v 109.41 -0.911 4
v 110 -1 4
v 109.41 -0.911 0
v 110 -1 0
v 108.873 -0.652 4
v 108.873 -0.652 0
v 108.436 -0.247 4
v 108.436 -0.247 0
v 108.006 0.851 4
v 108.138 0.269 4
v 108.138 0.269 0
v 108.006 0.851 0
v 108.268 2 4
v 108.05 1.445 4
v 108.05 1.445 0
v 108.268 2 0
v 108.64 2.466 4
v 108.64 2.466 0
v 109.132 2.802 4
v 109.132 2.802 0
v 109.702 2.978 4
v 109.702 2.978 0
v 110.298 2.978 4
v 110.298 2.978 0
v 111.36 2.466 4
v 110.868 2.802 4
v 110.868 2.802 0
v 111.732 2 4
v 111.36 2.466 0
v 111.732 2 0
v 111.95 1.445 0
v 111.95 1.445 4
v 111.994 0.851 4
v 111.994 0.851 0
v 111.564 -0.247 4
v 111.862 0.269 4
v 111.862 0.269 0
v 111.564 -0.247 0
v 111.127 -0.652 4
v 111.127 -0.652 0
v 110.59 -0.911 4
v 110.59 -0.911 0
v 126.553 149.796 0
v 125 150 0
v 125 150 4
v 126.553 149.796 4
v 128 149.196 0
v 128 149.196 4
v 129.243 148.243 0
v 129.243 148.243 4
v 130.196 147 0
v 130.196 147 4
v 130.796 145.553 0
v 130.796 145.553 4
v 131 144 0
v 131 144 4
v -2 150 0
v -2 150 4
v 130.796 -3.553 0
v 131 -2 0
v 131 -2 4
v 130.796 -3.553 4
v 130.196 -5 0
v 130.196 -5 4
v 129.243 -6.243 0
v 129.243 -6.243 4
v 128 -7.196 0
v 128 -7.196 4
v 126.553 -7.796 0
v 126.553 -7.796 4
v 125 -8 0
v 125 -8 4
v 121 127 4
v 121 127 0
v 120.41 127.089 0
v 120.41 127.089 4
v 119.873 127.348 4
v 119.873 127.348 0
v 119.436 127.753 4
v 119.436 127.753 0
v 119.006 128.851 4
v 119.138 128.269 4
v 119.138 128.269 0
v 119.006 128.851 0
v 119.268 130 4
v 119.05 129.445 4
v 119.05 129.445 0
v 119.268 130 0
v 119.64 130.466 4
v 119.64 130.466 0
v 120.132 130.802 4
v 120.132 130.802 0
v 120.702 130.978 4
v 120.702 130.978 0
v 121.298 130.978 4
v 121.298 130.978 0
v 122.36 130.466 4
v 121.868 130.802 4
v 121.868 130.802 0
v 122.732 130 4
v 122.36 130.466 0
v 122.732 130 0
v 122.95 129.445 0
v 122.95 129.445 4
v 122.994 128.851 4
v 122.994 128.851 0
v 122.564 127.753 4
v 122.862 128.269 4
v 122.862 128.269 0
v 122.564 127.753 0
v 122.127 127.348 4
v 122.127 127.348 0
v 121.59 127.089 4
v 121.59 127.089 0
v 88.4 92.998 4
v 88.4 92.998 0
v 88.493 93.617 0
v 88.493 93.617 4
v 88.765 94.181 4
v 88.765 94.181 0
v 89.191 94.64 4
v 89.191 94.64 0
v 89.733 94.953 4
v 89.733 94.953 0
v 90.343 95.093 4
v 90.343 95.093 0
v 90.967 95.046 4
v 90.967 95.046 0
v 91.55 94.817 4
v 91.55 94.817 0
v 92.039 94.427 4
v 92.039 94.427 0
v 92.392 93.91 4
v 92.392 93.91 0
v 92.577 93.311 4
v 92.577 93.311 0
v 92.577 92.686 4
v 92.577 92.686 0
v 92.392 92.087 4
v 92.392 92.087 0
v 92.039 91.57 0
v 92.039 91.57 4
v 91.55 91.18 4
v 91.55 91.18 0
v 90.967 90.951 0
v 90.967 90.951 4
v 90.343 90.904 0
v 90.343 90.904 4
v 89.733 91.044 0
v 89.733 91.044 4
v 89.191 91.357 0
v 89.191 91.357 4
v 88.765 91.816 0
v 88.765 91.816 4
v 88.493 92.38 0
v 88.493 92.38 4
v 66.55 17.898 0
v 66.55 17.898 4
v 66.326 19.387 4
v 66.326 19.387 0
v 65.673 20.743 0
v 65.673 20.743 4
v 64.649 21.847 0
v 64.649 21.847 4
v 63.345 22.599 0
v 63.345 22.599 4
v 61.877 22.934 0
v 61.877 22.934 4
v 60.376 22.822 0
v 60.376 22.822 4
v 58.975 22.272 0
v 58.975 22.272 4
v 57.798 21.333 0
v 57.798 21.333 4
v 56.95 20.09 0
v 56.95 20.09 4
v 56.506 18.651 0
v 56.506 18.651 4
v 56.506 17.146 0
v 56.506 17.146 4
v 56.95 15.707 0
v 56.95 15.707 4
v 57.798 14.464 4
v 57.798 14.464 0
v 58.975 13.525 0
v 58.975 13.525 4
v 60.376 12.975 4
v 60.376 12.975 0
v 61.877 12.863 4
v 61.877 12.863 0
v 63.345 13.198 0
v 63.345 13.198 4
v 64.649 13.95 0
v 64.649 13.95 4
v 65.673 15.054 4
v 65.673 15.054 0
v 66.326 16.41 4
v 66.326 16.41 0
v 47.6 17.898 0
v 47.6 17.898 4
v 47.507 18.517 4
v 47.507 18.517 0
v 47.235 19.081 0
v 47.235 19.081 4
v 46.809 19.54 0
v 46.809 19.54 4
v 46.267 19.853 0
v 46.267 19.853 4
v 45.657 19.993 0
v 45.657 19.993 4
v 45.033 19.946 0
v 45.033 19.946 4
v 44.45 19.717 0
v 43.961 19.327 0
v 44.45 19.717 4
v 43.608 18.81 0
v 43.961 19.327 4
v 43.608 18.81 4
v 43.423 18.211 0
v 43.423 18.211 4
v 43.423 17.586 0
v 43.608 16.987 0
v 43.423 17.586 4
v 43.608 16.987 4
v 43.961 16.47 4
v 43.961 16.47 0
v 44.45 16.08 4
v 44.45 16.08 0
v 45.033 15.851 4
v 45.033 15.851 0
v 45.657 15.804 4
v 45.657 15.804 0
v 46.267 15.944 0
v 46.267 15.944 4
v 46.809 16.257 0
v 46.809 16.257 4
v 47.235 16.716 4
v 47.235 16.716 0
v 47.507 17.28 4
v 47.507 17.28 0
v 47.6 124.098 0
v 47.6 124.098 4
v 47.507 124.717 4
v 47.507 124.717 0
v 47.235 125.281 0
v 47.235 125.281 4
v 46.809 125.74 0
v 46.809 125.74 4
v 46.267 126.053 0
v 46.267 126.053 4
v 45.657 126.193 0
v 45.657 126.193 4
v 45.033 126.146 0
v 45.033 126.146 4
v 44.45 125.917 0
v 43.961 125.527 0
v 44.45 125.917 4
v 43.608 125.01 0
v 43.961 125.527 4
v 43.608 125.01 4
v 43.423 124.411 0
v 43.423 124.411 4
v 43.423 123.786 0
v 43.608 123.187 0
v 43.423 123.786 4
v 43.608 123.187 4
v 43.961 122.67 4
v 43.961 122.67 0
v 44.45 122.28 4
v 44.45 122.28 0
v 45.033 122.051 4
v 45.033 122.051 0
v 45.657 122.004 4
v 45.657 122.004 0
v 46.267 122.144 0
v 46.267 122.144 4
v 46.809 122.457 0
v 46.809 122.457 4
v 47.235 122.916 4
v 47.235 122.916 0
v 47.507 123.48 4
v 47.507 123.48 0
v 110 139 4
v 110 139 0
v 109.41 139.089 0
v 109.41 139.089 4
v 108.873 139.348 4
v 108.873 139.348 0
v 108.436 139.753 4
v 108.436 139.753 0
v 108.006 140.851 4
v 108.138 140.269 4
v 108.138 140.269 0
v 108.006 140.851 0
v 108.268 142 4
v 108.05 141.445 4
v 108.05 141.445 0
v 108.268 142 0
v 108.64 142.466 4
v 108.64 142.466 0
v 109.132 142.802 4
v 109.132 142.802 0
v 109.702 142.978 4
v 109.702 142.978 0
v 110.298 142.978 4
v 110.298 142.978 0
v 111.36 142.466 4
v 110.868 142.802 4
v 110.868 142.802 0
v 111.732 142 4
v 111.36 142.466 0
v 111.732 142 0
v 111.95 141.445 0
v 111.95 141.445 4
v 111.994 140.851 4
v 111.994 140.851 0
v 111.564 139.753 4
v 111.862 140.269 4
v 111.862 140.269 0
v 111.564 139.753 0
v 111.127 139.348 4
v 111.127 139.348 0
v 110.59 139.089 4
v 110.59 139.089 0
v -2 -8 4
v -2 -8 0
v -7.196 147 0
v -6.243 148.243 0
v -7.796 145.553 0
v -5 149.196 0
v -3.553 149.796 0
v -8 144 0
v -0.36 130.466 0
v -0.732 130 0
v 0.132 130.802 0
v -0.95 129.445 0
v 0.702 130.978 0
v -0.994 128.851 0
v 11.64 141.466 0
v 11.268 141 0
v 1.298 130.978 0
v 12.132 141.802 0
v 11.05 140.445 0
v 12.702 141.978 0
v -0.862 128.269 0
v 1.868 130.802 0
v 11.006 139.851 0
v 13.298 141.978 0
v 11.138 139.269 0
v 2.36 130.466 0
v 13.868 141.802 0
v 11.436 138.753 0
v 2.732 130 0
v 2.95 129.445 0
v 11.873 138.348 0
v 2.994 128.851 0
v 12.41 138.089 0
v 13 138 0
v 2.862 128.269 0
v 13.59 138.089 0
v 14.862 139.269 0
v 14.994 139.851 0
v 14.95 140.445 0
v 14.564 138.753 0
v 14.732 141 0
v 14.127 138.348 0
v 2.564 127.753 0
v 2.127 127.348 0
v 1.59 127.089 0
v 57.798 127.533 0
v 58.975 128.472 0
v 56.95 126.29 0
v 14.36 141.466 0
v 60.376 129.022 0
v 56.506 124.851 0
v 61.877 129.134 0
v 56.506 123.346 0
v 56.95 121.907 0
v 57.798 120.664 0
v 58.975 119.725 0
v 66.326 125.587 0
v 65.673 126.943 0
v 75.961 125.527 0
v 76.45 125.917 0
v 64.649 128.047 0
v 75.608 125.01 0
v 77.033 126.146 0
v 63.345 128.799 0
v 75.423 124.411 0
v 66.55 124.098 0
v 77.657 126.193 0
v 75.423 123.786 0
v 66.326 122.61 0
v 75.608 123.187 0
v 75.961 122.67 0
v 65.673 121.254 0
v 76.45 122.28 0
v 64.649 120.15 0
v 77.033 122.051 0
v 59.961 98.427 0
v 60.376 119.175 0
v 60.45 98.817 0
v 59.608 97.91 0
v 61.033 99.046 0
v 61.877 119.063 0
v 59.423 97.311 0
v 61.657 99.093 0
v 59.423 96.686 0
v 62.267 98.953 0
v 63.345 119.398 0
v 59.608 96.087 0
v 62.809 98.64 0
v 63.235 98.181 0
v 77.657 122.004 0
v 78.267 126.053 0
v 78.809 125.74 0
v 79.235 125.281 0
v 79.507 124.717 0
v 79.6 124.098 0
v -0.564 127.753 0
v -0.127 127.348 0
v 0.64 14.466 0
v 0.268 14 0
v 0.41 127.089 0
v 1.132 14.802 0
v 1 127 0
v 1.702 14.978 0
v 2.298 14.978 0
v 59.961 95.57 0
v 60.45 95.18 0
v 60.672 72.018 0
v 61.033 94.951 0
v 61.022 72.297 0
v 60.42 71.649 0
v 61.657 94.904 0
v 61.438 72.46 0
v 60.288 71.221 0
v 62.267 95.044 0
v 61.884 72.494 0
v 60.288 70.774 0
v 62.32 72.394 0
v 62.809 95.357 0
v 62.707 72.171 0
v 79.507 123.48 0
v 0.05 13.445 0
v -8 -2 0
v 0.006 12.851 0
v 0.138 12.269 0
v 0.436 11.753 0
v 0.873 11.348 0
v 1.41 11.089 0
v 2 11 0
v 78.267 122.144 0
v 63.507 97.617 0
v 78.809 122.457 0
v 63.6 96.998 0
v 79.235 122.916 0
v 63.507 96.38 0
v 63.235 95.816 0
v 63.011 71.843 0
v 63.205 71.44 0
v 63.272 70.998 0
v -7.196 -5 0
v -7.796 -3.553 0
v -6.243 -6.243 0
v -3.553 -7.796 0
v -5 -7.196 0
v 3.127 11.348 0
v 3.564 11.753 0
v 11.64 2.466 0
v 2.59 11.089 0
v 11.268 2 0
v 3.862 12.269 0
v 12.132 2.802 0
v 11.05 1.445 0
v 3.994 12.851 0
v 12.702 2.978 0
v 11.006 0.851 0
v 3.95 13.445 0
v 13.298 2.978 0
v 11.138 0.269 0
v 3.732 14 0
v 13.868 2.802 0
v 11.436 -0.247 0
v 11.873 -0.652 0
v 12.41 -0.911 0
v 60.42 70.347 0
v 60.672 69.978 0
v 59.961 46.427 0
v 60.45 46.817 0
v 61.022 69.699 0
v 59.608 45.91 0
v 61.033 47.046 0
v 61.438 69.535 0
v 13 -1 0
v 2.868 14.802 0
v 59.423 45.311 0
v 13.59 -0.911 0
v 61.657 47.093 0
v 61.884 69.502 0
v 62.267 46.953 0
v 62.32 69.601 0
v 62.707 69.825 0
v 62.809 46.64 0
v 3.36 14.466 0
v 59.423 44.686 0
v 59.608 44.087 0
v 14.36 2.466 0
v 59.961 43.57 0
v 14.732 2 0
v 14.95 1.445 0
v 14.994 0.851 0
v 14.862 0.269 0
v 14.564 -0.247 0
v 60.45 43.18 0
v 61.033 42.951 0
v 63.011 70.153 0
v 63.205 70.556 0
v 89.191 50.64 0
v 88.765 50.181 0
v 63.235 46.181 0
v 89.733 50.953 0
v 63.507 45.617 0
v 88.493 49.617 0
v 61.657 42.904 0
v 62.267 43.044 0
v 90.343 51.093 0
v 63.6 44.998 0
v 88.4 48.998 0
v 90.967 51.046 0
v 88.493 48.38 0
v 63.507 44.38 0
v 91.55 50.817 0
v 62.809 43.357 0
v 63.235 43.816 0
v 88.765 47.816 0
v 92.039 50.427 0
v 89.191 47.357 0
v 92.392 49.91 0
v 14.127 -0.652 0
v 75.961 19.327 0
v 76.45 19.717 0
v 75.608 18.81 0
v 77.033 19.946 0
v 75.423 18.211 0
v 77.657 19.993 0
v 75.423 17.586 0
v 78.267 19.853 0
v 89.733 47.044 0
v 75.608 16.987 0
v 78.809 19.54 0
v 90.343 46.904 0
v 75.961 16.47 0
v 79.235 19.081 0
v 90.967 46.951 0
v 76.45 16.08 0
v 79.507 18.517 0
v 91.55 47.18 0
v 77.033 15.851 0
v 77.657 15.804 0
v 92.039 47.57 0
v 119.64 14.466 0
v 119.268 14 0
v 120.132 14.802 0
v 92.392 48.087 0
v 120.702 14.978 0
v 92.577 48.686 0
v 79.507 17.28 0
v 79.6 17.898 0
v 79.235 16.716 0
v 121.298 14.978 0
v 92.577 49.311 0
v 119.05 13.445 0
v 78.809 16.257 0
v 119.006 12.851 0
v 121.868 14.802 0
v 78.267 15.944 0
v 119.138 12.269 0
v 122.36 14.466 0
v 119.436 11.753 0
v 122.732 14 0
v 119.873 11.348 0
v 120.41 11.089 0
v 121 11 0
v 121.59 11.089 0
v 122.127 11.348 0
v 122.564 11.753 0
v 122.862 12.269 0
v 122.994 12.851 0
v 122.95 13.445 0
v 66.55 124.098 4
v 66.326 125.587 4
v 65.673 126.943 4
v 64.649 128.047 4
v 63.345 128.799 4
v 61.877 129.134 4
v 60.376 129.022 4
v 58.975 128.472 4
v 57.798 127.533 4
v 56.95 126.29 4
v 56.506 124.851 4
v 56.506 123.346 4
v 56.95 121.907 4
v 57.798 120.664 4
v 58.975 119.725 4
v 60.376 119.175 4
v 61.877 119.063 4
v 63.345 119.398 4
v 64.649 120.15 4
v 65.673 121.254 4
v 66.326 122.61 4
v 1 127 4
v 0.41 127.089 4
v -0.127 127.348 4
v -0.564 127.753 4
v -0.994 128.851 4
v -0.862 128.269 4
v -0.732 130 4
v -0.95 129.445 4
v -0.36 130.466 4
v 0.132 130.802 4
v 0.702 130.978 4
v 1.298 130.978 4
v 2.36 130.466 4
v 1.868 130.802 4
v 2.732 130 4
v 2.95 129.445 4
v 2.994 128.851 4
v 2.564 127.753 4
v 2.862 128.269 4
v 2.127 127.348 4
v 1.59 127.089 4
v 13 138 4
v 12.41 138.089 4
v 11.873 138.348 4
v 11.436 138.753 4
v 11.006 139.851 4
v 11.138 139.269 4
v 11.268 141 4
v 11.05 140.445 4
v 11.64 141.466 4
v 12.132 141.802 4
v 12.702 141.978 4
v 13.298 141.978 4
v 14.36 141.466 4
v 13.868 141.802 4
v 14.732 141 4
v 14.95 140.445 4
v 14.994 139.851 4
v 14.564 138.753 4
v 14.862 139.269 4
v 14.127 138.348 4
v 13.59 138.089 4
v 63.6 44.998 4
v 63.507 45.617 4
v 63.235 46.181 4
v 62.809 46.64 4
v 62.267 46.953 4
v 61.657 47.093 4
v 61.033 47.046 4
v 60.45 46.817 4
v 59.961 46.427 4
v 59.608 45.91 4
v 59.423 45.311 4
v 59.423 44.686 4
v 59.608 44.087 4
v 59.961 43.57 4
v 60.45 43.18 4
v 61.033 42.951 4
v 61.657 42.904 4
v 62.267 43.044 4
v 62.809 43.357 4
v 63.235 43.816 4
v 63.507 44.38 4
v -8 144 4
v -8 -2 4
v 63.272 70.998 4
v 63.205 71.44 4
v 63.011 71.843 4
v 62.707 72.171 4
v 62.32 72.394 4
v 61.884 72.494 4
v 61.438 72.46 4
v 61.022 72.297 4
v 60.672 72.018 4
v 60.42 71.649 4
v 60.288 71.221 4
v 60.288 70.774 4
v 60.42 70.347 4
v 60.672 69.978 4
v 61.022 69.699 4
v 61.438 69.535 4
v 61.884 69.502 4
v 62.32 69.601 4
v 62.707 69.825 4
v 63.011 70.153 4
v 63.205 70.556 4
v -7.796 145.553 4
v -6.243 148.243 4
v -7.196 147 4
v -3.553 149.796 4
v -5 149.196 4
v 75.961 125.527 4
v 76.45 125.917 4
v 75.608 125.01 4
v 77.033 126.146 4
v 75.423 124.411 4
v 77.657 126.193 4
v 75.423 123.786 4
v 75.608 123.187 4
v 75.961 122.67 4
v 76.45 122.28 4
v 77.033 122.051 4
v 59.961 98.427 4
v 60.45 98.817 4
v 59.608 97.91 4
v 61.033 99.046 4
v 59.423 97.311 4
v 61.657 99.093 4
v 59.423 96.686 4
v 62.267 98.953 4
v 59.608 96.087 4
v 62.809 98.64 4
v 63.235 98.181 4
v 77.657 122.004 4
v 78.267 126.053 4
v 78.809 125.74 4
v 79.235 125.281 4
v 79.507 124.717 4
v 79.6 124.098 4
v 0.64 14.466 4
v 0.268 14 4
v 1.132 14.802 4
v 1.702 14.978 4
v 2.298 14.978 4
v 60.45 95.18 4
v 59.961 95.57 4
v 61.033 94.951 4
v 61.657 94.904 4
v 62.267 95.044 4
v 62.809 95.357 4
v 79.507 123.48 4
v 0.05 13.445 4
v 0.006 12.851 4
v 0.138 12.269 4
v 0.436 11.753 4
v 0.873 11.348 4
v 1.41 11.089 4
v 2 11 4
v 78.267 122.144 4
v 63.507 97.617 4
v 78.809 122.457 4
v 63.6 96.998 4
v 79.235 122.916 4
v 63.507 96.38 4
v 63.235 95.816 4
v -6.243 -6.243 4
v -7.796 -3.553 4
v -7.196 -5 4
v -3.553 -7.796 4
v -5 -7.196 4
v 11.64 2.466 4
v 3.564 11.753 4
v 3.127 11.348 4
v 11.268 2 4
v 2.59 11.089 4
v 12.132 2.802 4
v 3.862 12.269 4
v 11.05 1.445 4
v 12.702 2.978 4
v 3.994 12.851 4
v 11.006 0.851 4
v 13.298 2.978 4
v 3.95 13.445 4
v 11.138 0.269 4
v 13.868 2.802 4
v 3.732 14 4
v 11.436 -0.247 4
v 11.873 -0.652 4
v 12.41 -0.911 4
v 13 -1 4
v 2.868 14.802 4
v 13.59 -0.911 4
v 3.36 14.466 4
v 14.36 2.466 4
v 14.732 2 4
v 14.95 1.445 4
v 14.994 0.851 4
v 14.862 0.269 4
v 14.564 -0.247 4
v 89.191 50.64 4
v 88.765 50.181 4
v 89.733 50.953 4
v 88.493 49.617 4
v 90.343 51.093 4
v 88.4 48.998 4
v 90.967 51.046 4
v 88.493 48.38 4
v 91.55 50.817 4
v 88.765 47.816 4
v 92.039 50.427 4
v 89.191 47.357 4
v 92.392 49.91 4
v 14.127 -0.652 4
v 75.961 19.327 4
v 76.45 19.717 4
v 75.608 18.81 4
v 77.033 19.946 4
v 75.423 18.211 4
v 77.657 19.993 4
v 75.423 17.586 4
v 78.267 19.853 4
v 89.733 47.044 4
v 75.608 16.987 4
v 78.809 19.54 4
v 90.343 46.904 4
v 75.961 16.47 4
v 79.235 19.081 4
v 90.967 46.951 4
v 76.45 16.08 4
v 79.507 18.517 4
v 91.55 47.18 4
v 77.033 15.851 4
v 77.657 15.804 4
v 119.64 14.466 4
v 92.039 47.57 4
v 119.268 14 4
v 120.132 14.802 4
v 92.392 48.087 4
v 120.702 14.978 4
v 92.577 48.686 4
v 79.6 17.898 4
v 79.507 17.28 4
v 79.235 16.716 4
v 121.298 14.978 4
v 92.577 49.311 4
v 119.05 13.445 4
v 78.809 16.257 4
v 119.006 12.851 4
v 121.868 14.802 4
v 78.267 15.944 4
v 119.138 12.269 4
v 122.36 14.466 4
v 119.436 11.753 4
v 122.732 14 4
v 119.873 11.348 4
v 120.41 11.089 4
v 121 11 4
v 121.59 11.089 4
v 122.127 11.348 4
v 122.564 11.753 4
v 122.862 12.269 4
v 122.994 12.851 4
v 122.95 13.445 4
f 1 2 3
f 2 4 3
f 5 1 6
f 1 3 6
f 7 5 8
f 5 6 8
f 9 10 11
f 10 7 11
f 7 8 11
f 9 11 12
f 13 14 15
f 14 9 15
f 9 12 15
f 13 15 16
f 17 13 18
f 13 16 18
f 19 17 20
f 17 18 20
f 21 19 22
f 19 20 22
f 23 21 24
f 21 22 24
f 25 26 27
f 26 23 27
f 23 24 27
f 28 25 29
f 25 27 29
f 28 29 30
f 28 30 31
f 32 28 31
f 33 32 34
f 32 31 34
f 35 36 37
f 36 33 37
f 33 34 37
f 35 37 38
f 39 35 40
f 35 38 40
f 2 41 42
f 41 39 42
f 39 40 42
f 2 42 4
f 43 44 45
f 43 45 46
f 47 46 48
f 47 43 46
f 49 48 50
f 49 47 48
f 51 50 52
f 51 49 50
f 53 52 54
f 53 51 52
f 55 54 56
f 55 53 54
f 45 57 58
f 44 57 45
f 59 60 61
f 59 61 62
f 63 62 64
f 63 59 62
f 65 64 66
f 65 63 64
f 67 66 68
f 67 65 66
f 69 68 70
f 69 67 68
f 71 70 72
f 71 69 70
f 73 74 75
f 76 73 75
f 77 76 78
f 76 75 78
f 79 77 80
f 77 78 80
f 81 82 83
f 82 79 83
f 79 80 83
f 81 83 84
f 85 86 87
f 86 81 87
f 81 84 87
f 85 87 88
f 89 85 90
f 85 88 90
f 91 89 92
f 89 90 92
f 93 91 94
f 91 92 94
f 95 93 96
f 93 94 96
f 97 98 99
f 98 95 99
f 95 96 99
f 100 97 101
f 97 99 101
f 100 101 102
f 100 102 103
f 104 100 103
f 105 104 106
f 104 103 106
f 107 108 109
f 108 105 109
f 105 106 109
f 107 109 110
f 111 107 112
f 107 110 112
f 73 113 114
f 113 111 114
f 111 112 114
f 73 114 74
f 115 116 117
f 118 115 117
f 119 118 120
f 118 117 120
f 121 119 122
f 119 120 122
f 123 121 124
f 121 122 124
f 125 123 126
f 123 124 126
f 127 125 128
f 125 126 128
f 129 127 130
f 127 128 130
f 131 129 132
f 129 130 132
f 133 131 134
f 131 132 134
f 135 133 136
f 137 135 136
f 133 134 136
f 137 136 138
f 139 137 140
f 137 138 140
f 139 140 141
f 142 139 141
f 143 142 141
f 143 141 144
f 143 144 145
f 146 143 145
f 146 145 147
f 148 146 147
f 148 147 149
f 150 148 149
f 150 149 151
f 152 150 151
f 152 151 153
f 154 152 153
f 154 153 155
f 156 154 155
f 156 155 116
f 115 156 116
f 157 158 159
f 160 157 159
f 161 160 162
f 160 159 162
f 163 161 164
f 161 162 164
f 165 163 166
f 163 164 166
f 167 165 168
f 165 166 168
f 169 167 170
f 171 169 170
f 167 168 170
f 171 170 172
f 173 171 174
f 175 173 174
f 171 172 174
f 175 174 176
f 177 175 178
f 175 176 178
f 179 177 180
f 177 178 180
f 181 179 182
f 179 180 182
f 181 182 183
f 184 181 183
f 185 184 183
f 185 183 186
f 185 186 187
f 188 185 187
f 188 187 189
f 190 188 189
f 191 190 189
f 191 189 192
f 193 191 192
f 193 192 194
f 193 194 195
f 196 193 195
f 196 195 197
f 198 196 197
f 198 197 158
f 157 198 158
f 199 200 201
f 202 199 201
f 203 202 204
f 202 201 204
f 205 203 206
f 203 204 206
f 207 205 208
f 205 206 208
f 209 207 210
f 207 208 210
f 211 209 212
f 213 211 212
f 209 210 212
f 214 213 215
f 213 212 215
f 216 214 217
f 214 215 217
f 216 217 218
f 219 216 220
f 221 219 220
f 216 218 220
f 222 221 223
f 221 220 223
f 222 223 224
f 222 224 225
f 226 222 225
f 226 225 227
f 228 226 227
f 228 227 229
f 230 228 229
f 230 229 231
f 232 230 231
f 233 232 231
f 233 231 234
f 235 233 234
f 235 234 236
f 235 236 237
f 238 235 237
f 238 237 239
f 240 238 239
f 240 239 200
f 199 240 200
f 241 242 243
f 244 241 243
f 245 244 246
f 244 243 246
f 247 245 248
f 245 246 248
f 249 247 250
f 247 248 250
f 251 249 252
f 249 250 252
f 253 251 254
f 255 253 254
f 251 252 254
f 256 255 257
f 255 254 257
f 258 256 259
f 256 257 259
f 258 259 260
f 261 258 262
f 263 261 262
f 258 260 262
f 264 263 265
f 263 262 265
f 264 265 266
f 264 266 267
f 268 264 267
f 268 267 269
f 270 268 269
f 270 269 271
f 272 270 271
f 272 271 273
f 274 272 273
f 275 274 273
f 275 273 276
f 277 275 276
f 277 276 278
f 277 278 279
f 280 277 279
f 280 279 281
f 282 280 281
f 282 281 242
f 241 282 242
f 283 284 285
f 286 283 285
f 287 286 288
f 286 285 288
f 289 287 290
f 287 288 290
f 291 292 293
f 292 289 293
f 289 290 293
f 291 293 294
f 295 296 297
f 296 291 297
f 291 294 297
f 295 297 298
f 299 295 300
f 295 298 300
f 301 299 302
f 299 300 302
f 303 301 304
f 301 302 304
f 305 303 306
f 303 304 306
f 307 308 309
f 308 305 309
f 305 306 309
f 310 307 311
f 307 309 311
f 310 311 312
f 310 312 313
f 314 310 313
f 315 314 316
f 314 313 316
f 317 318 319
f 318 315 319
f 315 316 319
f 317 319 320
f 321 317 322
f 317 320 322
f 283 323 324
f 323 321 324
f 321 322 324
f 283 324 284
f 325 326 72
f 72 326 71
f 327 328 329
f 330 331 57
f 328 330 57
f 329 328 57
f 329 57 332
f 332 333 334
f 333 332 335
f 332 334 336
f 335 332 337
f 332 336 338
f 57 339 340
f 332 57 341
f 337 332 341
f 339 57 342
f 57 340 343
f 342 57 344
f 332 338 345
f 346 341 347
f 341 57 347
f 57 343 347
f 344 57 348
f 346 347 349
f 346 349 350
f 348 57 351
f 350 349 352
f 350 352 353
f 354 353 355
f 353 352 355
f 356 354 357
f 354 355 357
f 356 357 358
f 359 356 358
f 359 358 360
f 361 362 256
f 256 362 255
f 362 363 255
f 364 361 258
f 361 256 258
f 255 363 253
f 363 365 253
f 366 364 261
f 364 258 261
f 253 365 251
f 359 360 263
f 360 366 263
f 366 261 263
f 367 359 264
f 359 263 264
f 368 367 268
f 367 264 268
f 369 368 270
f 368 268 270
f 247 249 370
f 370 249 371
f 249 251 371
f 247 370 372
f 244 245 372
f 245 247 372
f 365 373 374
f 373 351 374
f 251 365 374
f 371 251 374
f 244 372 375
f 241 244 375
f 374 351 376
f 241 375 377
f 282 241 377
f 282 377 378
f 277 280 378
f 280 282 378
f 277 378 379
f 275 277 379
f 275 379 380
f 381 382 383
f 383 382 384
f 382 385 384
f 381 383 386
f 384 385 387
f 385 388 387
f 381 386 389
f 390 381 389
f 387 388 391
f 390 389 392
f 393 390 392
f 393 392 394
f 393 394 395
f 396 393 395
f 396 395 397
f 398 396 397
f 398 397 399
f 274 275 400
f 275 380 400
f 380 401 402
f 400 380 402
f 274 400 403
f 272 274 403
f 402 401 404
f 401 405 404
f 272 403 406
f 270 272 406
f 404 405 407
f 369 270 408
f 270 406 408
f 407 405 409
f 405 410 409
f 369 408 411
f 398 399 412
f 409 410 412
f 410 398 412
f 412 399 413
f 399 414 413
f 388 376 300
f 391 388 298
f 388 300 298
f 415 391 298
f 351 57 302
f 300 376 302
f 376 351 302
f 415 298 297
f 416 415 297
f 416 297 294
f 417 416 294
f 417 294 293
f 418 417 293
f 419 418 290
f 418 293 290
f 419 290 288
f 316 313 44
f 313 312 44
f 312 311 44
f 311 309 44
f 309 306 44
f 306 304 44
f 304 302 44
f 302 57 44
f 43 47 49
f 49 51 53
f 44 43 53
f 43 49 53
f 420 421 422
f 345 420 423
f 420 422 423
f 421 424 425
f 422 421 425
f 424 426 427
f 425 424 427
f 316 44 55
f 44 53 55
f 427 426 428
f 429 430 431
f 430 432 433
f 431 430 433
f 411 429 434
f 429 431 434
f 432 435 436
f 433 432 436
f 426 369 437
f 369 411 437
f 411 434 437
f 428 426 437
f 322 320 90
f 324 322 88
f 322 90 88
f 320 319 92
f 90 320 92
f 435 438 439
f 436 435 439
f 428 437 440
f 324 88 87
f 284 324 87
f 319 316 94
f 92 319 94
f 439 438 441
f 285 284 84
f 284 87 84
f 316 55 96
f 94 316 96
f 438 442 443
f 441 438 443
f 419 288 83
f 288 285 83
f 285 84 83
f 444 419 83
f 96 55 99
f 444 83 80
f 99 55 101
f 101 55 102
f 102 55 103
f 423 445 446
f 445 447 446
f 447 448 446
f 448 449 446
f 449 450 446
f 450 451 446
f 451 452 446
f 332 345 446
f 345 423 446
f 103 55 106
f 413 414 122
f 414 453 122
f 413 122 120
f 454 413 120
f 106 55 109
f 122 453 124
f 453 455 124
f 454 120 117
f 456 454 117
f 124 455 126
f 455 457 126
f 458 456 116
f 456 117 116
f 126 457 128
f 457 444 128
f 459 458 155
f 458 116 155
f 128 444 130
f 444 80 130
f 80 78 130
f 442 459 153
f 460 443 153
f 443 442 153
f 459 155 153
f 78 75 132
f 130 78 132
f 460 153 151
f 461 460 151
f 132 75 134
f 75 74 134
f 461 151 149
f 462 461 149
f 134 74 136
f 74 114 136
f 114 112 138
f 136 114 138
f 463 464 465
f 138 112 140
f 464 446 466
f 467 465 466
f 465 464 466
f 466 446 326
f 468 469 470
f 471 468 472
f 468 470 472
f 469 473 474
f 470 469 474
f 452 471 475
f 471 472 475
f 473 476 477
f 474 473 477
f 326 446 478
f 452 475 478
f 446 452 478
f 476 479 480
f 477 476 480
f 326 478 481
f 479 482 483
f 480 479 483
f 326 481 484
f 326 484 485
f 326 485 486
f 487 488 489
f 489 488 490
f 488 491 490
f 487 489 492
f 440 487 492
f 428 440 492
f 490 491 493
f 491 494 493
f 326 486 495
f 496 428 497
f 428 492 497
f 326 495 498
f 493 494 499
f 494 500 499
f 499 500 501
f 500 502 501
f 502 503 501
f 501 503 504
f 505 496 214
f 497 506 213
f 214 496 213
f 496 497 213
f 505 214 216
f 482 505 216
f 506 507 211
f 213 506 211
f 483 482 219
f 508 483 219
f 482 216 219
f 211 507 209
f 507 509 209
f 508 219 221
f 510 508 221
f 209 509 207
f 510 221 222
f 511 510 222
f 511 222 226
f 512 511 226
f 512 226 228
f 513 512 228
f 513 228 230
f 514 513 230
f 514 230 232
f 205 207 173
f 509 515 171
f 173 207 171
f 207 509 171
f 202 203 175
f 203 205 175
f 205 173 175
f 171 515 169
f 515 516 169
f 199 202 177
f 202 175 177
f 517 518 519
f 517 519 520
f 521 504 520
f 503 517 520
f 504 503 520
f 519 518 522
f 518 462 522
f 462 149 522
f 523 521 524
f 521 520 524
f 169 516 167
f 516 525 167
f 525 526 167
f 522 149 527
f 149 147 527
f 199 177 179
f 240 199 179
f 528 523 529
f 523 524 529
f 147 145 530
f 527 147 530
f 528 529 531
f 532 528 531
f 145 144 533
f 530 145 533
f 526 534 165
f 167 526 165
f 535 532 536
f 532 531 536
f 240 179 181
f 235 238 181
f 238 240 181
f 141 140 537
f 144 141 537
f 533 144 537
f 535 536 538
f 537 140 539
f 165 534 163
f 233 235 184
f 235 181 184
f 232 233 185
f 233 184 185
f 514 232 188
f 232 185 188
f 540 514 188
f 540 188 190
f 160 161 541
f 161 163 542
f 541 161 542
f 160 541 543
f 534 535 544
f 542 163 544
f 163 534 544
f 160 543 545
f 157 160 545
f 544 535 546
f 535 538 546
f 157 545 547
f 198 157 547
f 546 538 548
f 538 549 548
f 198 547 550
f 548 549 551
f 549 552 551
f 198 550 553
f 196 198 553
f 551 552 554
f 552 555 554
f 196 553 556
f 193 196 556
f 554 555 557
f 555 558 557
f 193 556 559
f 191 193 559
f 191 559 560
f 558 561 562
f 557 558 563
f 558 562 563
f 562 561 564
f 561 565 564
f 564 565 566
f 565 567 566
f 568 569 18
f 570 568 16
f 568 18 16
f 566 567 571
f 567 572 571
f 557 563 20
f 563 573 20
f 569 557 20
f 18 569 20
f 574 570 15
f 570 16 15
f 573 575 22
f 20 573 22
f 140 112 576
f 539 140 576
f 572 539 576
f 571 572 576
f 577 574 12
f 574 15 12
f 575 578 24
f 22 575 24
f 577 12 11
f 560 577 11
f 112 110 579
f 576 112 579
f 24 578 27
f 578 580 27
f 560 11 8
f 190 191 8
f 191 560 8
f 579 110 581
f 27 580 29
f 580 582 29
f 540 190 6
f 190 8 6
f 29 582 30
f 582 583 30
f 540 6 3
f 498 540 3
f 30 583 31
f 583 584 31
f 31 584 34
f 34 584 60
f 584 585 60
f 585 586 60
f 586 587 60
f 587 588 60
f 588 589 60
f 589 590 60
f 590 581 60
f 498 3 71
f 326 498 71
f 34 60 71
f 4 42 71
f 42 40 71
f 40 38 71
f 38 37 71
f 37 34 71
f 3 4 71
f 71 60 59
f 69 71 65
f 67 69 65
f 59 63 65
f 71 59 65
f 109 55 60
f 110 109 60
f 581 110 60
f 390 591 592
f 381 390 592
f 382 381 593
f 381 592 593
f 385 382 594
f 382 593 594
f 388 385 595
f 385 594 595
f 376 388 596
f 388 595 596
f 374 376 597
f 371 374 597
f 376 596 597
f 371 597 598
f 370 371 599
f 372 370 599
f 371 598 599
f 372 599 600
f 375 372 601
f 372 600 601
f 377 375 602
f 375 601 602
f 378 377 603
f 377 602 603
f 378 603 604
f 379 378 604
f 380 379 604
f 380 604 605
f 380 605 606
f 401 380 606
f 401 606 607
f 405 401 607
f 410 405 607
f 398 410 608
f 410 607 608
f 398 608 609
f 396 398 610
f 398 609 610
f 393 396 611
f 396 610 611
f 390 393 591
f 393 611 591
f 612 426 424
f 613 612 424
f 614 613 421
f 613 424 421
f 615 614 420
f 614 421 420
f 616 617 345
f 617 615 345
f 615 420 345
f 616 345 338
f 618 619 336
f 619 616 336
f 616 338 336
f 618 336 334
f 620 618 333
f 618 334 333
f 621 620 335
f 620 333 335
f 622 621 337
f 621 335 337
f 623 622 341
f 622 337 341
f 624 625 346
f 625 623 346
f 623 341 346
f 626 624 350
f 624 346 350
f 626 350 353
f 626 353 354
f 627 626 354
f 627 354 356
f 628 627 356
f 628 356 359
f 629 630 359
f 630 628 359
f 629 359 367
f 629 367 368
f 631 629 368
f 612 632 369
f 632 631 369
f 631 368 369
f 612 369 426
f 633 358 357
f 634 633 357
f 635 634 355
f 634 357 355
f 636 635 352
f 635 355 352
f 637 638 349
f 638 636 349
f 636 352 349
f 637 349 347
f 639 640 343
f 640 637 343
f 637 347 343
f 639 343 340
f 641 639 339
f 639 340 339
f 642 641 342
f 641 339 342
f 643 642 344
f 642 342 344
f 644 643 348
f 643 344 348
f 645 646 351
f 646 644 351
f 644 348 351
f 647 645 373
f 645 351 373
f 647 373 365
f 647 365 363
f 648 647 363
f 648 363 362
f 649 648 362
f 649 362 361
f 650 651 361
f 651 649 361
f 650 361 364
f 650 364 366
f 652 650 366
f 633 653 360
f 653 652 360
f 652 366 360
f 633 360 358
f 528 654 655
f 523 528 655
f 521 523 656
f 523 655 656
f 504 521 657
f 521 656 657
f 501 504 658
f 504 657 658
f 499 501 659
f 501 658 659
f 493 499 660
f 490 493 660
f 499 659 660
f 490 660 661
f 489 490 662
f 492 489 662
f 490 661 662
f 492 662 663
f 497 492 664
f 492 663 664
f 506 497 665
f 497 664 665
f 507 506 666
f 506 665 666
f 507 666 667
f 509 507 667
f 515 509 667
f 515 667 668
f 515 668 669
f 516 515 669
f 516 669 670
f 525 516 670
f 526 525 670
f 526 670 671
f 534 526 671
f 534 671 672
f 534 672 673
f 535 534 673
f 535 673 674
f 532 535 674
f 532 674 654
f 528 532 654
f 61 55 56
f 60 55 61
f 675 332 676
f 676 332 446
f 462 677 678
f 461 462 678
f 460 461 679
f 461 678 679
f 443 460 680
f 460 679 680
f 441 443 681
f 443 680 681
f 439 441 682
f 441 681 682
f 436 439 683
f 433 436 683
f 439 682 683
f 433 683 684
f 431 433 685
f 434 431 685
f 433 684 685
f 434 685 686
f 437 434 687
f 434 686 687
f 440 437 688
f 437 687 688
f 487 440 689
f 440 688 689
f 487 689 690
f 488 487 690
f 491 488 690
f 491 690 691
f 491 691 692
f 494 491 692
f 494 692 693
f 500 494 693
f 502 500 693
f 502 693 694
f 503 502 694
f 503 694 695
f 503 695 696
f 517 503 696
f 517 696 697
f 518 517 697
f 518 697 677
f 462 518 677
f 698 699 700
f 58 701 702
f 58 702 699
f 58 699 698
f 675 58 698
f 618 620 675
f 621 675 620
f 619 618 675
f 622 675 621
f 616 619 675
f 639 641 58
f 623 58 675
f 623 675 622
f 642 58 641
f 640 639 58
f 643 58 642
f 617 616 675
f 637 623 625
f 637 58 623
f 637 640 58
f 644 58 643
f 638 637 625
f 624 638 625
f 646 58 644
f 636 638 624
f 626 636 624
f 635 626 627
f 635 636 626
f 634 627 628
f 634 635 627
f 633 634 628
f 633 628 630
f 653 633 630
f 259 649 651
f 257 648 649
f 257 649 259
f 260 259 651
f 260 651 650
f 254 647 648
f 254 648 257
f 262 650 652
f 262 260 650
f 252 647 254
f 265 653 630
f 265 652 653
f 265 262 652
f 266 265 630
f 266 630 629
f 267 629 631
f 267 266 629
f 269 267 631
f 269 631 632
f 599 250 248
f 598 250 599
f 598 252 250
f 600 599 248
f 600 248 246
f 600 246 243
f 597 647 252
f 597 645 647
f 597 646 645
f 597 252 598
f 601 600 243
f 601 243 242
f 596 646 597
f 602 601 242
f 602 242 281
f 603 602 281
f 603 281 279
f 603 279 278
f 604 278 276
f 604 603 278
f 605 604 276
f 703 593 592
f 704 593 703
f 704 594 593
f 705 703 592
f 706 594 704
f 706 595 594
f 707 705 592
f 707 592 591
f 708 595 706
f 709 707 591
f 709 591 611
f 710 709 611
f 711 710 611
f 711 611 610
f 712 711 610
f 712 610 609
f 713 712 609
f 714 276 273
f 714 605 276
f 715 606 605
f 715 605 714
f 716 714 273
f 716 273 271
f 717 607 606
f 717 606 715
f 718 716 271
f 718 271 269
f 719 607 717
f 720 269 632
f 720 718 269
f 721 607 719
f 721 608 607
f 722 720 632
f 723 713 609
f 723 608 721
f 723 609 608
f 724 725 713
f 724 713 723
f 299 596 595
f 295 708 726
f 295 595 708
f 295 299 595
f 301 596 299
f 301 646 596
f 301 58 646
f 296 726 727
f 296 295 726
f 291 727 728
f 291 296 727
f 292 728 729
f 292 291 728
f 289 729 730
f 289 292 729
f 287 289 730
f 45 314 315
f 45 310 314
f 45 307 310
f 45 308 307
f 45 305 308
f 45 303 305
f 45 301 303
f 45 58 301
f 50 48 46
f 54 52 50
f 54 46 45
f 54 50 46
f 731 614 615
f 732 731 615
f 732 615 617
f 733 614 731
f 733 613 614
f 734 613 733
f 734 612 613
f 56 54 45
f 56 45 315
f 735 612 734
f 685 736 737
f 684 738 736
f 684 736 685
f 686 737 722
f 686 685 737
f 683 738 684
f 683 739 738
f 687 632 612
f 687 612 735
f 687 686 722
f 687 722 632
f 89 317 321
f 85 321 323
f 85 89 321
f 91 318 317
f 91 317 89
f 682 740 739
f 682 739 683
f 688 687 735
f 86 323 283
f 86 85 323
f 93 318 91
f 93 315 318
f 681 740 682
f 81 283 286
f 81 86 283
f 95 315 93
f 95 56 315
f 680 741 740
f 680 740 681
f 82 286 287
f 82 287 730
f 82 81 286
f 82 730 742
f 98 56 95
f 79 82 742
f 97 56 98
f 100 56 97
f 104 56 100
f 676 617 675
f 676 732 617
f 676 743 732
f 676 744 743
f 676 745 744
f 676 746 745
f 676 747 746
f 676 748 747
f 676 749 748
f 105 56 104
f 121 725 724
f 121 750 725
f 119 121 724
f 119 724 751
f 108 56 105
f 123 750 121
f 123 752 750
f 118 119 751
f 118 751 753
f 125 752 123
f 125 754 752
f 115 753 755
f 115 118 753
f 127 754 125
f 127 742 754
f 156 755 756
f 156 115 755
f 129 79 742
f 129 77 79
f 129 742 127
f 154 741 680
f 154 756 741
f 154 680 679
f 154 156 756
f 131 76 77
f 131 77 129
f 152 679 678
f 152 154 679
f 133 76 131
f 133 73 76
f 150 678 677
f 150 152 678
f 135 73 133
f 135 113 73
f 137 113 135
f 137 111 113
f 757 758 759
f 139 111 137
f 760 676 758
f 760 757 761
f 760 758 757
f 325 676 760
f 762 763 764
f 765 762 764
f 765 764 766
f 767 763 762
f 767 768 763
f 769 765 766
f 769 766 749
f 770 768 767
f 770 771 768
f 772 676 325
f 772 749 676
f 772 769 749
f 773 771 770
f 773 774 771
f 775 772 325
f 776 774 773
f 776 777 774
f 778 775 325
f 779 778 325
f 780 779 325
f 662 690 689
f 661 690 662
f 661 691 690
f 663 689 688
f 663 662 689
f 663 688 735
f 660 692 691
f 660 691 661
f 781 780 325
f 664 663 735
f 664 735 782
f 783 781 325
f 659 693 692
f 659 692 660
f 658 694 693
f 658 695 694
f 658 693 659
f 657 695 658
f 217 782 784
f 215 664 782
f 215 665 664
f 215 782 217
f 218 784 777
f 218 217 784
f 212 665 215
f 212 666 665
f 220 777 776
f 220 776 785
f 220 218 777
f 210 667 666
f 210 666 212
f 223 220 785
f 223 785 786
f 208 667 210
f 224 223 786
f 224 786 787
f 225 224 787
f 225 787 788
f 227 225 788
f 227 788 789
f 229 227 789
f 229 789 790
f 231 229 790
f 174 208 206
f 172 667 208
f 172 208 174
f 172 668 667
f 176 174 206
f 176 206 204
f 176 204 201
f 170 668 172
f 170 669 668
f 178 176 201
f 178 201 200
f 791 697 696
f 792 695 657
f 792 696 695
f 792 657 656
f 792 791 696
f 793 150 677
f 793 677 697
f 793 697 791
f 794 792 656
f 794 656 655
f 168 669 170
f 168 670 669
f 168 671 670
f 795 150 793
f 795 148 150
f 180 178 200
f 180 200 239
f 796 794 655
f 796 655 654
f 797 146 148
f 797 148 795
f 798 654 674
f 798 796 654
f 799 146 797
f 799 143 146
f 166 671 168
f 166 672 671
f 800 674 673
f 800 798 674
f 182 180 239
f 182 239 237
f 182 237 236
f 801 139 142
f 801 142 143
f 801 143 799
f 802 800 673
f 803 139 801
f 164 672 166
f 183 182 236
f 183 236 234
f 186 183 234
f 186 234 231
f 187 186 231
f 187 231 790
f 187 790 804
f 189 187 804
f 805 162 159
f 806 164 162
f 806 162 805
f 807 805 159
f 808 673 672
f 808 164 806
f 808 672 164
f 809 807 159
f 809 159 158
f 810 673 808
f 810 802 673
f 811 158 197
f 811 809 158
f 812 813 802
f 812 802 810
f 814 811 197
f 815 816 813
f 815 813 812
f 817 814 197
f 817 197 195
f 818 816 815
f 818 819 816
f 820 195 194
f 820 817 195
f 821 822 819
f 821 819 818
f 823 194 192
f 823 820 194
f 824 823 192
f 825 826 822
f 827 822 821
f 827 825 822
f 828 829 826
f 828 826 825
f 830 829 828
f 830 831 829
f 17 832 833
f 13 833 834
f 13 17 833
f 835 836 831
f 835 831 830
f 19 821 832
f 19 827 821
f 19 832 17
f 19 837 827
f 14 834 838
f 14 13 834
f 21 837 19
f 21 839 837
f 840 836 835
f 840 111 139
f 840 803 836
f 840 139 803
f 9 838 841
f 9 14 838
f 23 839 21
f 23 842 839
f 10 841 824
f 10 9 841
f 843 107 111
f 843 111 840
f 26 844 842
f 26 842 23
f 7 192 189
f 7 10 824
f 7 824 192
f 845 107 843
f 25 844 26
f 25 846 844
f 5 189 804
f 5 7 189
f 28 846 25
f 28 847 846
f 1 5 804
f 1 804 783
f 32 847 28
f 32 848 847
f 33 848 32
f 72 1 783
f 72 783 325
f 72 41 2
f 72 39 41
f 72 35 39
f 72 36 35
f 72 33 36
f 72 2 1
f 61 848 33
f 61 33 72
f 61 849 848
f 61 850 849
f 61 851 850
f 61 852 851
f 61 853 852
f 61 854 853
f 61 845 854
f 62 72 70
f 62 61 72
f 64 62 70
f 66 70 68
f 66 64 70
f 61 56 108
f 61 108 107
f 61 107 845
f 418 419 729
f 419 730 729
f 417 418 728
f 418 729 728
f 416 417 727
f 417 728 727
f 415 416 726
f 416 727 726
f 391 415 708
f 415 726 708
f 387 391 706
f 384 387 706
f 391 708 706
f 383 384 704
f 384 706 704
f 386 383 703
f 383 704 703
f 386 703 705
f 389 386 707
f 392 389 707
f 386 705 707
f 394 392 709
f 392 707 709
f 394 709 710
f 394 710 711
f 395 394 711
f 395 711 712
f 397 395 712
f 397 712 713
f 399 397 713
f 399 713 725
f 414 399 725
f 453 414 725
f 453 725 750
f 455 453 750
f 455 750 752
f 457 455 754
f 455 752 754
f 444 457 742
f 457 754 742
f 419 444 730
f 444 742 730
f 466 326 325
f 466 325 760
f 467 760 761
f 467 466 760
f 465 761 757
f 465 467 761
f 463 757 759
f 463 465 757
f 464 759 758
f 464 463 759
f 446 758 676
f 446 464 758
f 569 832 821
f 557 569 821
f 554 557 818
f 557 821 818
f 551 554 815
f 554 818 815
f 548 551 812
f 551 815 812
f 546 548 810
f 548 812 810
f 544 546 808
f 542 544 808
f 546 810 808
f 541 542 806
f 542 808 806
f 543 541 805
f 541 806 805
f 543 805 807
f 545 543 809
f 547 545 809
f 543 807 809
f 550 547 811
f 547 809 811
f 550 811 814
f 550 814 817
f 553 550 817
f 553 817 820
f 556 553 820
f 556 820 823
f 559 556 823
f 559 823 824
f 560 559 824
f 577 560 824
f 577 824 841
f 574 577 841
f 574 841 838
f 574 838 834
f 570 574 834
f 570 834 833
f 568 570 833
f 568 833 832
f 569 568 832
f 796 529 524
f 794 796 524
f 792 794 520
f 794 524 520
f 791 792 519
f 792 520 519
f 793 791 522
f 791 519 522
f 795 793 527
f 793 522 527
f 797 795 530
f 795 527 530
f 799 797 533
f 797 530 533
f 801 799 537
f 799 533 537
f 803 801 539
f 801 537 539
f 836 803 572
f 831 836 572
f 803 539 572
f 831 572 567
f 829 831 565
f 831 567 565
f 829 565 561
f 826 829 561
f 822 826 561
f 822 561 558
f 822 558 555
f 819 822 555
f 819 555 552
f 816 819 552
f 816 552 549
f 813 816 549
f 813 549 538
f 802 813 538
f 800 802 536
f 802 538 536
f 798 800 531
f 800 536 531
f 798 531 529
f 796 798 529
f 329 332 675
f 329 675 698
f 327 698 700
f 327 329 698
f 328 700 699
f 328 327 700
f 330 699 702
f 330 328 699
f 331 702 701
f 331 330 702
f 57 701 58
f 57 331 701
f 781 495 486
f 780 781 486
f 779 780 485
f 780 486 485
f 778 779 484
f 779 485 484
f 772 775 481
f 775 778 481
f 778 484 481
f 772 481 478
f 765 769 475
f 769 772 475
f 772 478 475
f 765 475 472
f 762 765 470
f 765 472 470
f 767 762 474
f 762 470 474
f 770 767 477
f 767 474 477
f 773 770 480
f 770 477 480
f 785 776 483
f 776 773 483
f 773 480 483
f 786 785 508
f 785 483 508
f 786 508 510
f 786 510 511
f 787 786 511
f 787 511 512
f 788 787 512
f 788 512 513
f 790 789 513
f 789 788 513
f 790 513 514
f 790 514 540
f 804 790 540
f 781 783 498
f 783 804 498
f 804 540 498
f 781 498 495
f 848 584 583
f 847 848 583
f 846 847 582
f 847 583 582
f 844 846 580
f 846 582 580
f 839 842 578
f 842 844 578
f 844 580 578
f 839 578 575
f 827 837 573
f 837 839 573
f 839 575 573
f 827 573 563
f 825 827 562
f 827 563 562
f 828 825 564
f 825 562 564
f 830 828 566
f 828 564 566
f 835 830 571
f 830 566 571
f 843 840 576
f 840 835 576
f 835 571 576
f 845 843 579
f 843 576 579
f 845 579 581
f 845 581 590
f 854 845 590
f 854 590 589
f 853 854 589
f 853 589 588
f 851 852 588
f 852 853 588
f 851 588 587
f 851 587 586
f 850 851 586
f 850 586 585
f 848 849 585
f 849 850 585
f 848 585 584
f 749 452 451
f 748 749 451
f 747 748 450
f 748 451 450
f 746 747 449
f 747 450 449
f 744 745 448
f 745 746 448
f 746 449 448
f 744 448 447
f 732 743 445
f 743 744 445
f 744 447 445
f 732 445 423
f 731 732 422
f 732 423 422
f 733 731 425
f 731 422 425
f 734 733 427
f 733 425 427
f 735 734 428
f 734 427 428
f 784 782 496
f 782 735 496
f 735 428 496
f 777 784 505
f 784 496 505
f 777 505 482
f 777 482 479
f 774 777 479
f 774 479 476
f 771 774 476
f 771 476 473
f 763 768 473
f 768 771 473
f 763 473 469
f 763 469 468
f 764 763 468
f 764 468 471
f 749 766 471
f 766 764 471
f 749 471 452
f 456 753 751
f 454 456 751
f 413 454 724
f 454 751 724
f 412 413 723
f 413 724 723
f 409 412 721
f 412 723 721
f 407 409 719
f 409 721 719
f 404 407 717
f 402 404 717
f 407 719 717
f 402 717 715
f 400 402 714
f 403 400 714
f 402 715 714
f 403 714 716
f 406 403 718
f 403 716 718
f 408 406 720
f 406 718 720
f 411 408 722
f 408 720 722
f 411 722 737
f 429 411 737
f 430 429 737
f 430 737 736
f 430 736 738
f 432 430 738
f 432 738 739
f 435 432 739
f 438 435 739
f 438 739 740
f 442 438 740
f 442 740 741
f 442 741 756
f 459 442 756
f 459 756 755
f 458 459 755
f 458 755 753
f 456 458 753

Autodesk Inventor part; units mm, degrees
ref_plane "YZ Plane" through (0, 0, 0) normal (1, 0, 0) x (0, 1, 0)
ref_plane "XZ Plane" through (0, 0, 0) normal (0, 1, 0) x (-1, 0, 0)
ref_plane "XY Plane" through (0, 0, 0) normal (0, 0, 1) x (1, 0, 0)
ref_plane "Plano de trabalho1" through (0, 142, 0) normal (0, 0, 1) x (0, -1, 0)
sketch "Esboço1" plane through (0, 142, 0) normal (0, 0, 1) x (0, -1, 0)
  arc A0 (124, -4) -> (125, -5) centre (125, -4) ccw projected
  line L0 (142, -5) -> (125, -5) projected
  line L1 (142, -5) -> (142, -8) projected
  line L2 (142, -8) -> (144, -8) projected
  arc A1 (144, -8) -> (150, -2) centre (144, -2) ccw projected
  line L3 (150, -2) -> (150, 0) projected
  line L4 (150, 0) -> (147, 0) projected
  line L5 (147, 0) -> (147, 17) projected
  arc A2 (147, 17) -> (146, 18) centre (146, 17) ccw projected
  line L6 (135, 18) -> (146, 18) projected
  arc A3 (135, 18) -> (134, 17) centre (135, 17) ccw projected
  line L7 (134, 9) -> (134, 17) projected
  arc A4 (133, 8) -> (134, 9) centre (133, 9) ccw projected
  line L8 (133, 8) -> (124, 8) projected
  line L9 (124, -4) -> (124, 8) projected
  circle A5 centre (141, 13) radius 2 projected
  circle A6 centre (129, 2) radius 2 projected
  arc A7 (-4, 18) -> (-5, 17) centre (-4, 17) ccw projected
  line L10 (-5, 0) -> (-5, 17) projected
  line L11 (-5, 0) -> (-8, 0) projected
  line L12 (-8, 0) -> (-8, -2) projected
  arc A8 (-8, -2) -> (-2, -8) centre (-2, -2) ccw projected
  line L13 (-2, -8) -> (0, -8) projected
  line L14 (0, -8) -> (0, -5) projected
  line L15 (0, -5) -> (17, -5) projected
  arc A9 (17, -5) -> (18, -4) centre (17, -4) ccw projected
  line L16 (18, 7) -> (18, -4) projected
  arc A10 (18, 7) -> (17, 8) centre (17, 7) ccw projected
  line L17 (9, 8) -> (17, 8) projected
  arc A11 (8, 9) -> (9, 8) centre (9, 9) ccw projected
  line L18 (8, 9) -> (8, 18) projected
  line L19 (-4, 18) -> (8, 18) projected
  circle A12 centre (13, 1) radius 2 projected
  circle A13 centre (2, 13) radius 2 projected
  circle A14 centre (141, 110) radius 2 projected
  circle A15 centre (129, 121) radius 2 projected
  arc A16 (146, 105) -> (147, 106) centre (146, 106) ccw projected
  line L20 (147, 123) -> (147, 106) projected
  line L21 (150, 123) -> (147, 123) projected
  line L22 (150, 125) -> (150, 123) projected
  arc A17 (150, 125) -> (144, 131) centre (144, 125) ccw projected
  line L23 (144, 131) -> (124, 131) projected
  line L24 (124, 116) -> (124, 131) projected
  arc A18 (124, 116) -> (125, 115) centre (125, 116) ccw projected
  line L25 (133, 115) -> (125, 115) projected
  arc A19 (134, 114) -> (133, 115) centre (133, 114) ccw projected
  line L26 (134, 114) -> (134, 106) projected
  arc A20 (134, 106) -> (135, 105) centre (135, 106) ccw projected
  line L27 (146, 105) -> (135, 105) projected
  arc A21 (17, 115) -> (18, 116) centre (17, 116) ccw projected
  line L28 (18, 131) -> (18, 116) projected
  line L29 (-2, 131) -> (18, 131) projected
  arc A22 (-2, 131) -> (-8, 125) centre (-2, 125) ccw projected
  line L30 (-8, 125) -> (-8, 123) projected
  line L31 (-8, 123) -> (-5, 123) projected
  line L32 (-5, 123) -> (-5, 106) projected
  arc A23 (-5, 106) -> (-4, 105) centre (-4, 106) ccw projected
  line L33 (7, 105) -> (-4, 105) projected
  arc A24 (7, 105) -> (8, 106) centre (7, 106) ccw projected
  line L34 (8, 114) -> (8, 106) projected
  arc A25 (9, 115) -> (8, 114) centre (9, 114) ccw projected
  line L35 (9, 115) -> (17, 115) projected
  circle A26 centre (1, 110) radius 2 projected
  circle A27 centre (13, 121) radius 2 projected
  line L36 (18, 131) -> (124.2929, 131)
  line L37 (150, 123) -> (150, 0)
  line L38 (0, -8) -> (142, -8)
  line L39 (-8, 0) -> (-8, 123)
  point P0 (142, 0)
extrude "Extrusão1" add sketch "Esboço1" along normal blind 4
sketch "Esboço2" plane through (0, 142, 4) normal (0, 0, 1) x (1, 0, 0)
  circle A0 centre (61.5, -17.9015) radius 5 projected
  circle A1 centre (61.5, -124.1015) radius 5 projected
  circle A2 centre (61.7717, -71.0022) radius 5.8 projected
  circle A3 centre (61.5, -45.0015) radius 2.1 projected
  circle A4 centre (61.5, -97.0015) radius 2.1 projected
  circle A5 centre (61.5, -17.9015) radius 5.05
  circle A6 centre (61.5, -45.0015) radius 2.1
  circle A7 centre (61.5, -97.0015) radius 2.1
  circle A8 centre (61.7717, -71.0022) radius 1.5
  circle A9 centre (61.5, -124.1015) radius 5
  point P0 (0, -142)
  dimension "d2" = 10.1
  dimension "d3" = 4.2
  dimension "d4" = 3
  dimension "d19" = 10
extrude "Extrusão2" cut sketch "Esboço2" against normal blind 4 contours A0 | A1 | A3 | A4 | A8
sketch "Esboço3" plane through (0, 142, 4) normal (0, 0, 1) x (1, 0, 0)
  circle A0 centre (61.5, -124.1015) radius 5 projected
  circle A1 centre (61.5, -124.1015) radius 16
  circle A2 centre (61.5, -17.9015) radius 5 projected
  circle A3 centre (61.5, -17.9015) radius 16
  line L0 (45.5, -17.9015) -> (77.5, -17.9015)
  line L1 (45.5, -124.1015) -> (77.5, -124.1015)
  circle A4 centre (77.5, -124.1015) radius 2.1
  circle A5 centre (45.5, -124.1015) radius 2.1
  circle A6 centre (77.5, -17.9015) radius 2.1
  circle A7 centre (45.5, -17.9015) radius 2.1
  point P0 (0, -142)
  dimension "d7" = 32
  dimension "d8" = 32
  dimension "d9" = 4.2
  dimension "d10" = 4.2
  dimension "d11" = 4.2
  dimension "d12" = 4.2
extrude "Extrusão3" cut sketch "Esboço3" against normal blind 4 contours A4 A1 L1 | L1 A1 A4 | A5 A1 L1 | L1 A1 A5 | A1 A4 | A1 A5 | A6 A3 L0 | L0 A3 A6 | A7 A3 L0 | L0 A3 A7 | A3 A6 | A3 A7
sketch "Esboço4" plane through (0, 142, 0) normal (0, 0, -1) x (-1, 0, 0)
  circle A0 centre (-90.5, -93.0015) radius 2.1
  circle A1 centre (-90.5, -49.0015) radius 2.1
  point P0 (0, -142)
  dimension "d15" = 4.2
  dimension "d16" = 4.2
extrude "Extrusão4" cut sketch "Esboço4" against normal blind 4
sketch "Esboço5" plane through (0, 142, 4) normal (0, 0, 1) x (1, 0, 0)
  circle A0 centre (61.5, -124.1015) radius 5 projected
  circle A1 centre (61.5, -124.1015) radius 5.05
  circle A2 centre (61.5, -17.9015) radius 5 projected
  circle A3 centre (61.5, -17.9015) radius 5.05
  point P0 (0, -142)
  dimension "d20" = 10.1
  dimension "d21" = 10.1
extrude "Extrusão5" cut sketch "Esboço5" against normal blind 10
properties part number "fechamentocima"
